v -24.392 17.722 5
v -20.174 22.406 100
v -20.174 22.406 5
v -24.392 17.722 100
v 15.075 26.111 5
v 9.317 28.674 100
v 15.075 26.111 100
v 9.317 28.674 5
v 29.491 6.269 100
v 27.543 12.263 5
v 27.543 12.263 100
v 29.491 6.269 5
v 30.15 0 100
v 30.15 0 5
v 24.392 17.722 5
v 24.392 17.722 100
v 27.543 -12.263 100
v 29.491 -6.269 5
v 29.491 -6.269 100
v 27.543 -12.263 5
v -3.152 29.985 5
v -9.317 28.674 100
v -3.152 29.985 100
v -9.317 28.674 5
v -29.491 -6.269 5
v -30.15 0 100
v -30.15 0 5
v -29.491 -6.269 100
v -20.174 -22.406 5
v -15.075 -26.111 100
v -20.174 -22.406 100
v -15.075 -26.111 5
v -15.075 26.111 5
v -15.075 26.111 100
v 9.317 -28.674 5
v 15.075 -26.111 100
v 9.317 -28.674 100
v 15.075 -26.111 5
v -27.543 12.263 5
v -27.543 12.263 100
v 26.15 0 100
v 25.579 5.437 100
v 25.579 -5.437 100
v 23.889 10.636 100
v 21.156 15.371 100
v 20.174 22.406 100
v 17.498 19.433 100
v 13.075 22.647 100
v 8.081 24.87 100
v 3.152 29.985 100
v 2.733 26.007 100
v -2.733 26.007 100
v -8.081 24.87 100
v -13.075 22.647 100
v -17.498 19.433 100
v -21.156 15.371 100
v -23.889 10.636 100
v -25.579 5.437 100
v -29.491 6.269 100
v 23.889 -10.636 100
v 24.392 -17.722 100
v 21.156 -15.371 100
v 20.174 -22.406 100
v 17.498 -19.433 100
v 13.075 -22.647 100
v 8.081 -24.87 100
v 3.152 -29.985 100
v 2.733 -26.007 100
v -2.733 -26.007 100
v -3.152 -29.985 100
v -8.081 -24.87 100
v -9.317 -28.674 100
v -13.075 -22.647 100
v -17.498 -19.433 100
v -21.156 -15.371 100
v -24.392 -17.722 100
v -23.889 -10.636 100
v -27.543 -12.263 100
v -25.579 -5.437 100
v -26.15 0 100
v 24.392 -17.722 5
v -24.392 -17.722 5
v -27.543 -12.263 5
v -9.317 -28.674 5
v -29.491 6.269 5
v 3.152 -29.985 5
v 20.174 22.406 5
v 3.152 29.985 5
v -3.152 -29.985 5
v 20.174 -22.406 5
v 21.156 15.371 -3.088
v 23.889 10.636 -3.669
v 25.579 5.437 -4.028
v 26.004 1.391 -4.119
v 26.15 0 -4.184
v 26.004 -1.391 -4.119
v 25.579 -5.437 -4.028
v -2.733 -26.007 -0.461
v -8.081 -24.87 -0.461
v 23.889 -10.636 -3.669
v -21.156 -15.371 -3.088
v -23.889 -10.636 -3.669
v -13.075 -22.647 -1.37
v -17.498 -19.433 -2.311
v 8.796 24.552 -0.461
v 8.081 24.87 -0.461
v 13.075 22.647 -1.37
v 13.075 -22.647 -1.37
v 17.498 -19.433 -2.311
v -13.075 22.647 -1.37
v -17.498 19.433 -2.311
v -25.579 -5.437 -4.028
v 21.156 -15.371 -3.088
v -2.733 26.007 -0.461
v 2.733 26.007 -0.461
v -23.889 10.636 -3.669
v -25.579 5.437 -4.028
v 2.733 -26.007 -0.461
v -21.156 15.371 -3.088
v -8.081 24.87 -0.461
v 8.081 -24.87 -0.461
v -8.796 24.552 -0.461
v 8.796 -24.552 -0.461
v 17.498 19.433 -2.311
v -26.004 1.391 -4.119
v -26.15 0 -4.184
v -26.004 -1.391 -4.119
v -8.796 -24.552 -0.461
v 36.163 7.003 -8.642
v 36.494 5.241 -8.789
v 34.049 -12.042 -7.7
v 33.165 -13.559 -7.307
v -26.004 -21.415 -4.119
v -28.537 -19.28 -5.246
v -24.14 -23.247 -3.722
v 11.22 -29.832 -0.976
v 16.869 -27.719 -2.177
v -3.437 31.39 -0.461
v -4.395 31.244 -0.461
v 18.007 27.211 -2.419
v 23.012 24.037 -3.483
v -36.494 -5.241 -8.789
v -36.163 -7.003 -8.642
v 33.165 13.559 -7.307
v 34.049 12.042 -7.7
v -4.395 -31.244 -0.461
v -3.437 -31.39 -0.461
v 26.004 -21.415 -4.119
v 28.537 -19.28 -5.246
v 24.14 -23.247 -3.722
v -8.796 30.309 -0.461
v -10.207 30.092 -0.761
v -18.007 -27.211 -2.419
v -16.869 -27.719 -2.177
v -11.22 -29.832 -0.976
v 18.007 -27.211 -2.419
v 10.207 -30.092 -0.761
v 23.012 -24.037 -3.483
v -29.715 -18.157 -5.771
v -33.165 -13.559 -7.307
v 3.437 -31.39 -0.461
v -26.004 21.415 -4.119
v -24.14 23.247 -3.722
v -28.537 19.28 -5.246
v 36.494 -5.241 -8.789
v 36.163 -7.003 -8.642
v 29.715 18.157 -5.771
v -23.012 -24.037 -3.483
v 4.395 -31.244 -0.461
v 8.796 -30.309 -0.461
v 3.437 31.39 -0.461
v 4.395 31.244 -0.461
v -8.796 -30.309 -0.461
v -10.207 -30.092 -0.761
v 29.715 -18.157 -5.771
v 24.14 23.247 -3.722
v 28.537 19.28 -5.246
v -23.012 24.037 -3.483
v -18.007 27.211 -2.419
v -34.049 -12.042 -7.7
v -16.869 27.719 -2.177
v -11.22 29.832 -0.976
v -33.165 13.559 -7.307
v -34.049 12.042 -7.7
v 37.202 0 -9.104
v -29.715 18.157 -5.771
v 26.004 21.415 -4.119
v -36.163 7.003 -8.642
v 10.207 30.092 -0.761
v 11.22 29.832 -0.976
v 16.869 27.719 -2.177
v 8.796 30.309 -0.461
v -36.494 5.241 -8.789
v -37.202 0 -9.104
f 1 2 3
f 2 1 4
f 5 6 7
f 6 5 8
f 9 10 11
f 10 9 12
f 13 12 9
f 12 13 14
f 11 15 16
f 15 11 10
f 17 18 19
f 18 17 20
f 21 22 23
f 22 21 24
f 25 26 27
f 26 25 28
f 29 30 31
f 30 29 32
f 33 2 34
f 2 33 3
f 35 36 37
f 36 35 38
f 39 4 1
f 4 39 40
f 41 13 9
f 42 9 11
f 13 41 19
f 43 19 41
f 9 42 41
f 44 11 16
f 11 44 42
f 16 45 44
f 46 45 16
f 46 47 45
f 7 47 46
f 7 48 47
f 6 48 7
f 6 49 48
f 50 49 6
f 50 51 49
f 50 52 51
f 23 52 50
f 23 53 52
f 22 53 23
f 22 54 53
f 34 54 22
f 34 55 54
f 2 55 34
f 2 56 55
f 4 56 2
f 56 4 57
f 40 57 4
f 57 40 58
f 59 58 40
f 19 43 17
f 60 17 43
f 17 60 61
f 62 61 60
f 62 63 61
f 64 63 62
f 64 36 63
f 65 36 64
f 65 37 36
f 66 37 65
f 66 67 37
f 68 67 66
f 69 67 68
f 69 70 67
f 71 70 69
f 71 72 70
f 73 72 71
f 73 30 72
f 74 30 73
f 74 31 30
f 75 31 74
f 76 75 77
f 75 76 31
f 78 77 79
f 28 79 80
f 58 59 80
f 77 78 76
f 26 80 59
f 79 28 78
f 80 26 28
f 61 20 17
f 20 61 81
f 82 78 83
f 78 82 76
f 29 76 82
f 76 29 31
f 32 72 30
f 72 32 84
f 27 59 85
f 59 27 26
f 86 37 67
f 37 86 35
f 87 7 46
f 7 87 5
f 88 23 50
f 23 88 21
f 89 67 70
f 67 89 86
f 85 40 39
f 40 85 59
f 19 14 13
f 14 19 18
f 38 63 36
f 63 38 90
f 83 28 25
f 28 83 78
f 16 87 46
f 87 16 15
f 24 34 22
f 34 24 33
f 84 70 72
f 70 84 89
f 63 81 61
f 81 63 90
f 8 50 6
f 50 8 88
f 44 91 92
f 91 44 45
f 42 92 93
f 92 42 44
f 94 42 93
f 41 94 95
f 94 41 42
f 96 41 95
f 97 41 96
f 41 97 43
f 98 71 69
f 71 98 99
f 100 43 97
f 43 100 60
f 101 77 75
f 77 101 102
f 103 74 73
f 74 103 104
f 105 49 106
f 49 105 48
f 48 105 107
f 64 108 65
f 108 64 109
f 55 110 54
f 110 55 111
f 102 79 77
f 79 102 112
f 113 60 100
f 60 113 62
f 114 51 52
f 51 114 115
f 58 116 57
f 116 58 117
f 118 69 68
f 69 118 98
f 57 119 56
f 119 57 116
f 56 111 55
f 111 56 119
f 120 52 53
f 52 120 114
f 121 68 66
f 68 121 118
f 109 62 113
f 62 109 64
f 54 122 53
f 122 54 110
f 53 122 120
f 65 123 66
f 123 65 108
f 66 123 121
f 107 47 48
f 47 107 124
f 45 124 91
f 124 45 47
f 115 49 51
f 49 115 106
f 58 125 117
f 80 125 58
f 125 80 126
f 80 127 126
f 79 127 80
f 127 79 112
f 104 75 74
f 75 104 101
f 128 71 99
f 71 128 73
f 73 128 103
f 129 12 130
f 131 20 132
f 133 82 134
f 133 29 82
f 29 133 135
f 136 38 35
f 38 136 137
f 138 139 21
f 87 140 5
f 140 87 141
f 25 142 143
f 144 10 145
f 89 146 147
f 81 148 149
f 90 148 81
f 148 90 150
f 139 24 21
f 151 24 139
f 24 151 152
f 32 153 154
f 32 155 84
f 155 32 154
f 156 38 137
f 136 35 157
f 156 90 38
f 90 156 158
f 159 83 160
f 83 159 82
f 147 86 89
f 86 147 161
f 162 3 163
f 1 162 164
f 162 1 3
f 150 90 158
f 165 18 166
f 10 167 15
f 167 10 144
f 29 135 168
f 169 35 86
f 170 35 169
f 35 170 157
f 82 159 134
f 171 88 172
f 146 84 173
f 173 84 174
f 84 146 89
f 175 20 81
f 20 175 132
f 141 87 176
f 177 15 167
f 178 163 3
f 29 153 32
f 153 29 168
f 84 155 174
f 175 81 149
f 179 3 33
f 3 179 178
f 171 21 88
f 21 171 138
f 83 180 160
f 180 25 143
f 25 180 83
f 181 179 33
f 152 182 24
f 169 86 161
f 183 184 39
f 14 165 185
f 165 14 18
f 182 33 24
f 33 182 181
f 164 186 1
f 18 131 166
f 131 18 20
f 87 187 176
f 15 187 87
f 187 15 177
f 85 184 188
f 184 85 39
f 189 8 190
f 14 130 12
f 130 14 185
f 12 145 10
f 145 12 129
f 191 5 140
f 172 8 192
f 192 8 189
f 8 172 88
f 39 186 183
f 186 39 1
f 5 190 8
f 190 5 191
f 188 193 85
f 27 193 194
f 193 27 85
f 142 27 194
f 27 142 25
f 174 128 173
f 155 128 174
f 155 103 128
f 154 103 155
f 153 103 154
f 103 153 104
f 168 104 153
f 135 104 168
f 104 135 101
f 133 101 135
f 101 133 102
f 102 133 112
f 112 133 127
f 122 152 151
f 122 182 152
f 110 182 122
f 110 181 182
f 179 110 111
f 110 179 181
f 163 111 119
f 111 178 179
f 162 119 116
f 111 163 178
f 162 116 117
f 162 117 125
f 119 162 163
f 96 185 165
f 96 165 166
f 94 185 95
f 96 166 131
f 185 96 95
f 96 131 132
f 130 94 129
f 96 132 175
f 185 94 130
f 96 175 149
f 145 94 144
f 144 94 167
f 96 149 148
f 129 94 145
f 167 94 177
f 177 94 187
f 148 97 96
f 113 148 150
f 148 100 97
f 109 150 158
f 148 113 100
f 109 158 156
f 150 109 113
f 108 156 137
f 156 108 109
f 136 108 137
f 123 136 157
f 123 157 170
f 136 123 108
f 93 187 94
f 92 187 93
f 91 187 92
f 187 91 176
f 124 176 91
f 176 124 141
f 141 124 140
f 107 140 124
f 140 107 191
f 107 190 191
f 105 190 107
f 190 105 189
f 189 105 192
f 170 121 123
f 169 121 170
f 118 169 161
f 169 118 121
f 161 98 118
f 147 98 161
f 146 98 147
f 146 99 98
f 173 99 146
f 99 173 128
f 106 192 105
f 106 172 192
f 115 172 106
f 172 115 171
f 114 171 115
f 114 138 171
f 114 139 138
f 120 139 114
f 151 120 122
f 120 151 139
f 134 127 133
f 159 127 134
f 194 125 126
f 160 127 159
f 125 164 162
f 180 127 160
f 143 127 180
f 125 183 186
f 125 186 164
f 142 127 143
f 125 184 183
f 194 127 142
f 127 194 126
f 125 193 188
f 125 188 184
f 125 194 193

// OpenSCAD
//saddle.scad
//creates a saddle based on shell and branch dimensions
//parameters:D = shell od, d = branch od, t = branch thickness, 
//a = angle of fillet along z axis, b = angle of fillet alang x axis
//==================================================================

//Example: saddle(D=168.3,d=60.3,t=4,a=30,b=15,f=5);
//saddle();

module saddle(D=168.3,d=60.3,t=4,a=30,b=15,f=5){
    
    l=D/2;  echo(l);
    m=d+2*sin(a)*l;echo(m);
    M=d+2*sin(b)*l;echo(M);

    difference(){
            translate([0,0,-f])hull(){
                cylinder(h=0.1,d=d);
                translate([0,0,l])scale([1,M/m,1])cylinder(h=0.1,d=m);
            }
            translate([0,0,D/2])
       rotate([90,0,0])cylinder(h=M+2,d=D,center=true);    //subtract shell
        cylinder(h=d+f,d=d-2*t,center=true);    //pipe bore
    }
}

branch();

module branch(d=60.3,l=100,t=4,saddle=true){
    difference(){
        cylinder(h=l,d=d);
        translate([0,0,-1])cylinder(h=l+2,d=d-2*t);
    }
    if(saddle)rotate([180,0,0])saddle();
}
